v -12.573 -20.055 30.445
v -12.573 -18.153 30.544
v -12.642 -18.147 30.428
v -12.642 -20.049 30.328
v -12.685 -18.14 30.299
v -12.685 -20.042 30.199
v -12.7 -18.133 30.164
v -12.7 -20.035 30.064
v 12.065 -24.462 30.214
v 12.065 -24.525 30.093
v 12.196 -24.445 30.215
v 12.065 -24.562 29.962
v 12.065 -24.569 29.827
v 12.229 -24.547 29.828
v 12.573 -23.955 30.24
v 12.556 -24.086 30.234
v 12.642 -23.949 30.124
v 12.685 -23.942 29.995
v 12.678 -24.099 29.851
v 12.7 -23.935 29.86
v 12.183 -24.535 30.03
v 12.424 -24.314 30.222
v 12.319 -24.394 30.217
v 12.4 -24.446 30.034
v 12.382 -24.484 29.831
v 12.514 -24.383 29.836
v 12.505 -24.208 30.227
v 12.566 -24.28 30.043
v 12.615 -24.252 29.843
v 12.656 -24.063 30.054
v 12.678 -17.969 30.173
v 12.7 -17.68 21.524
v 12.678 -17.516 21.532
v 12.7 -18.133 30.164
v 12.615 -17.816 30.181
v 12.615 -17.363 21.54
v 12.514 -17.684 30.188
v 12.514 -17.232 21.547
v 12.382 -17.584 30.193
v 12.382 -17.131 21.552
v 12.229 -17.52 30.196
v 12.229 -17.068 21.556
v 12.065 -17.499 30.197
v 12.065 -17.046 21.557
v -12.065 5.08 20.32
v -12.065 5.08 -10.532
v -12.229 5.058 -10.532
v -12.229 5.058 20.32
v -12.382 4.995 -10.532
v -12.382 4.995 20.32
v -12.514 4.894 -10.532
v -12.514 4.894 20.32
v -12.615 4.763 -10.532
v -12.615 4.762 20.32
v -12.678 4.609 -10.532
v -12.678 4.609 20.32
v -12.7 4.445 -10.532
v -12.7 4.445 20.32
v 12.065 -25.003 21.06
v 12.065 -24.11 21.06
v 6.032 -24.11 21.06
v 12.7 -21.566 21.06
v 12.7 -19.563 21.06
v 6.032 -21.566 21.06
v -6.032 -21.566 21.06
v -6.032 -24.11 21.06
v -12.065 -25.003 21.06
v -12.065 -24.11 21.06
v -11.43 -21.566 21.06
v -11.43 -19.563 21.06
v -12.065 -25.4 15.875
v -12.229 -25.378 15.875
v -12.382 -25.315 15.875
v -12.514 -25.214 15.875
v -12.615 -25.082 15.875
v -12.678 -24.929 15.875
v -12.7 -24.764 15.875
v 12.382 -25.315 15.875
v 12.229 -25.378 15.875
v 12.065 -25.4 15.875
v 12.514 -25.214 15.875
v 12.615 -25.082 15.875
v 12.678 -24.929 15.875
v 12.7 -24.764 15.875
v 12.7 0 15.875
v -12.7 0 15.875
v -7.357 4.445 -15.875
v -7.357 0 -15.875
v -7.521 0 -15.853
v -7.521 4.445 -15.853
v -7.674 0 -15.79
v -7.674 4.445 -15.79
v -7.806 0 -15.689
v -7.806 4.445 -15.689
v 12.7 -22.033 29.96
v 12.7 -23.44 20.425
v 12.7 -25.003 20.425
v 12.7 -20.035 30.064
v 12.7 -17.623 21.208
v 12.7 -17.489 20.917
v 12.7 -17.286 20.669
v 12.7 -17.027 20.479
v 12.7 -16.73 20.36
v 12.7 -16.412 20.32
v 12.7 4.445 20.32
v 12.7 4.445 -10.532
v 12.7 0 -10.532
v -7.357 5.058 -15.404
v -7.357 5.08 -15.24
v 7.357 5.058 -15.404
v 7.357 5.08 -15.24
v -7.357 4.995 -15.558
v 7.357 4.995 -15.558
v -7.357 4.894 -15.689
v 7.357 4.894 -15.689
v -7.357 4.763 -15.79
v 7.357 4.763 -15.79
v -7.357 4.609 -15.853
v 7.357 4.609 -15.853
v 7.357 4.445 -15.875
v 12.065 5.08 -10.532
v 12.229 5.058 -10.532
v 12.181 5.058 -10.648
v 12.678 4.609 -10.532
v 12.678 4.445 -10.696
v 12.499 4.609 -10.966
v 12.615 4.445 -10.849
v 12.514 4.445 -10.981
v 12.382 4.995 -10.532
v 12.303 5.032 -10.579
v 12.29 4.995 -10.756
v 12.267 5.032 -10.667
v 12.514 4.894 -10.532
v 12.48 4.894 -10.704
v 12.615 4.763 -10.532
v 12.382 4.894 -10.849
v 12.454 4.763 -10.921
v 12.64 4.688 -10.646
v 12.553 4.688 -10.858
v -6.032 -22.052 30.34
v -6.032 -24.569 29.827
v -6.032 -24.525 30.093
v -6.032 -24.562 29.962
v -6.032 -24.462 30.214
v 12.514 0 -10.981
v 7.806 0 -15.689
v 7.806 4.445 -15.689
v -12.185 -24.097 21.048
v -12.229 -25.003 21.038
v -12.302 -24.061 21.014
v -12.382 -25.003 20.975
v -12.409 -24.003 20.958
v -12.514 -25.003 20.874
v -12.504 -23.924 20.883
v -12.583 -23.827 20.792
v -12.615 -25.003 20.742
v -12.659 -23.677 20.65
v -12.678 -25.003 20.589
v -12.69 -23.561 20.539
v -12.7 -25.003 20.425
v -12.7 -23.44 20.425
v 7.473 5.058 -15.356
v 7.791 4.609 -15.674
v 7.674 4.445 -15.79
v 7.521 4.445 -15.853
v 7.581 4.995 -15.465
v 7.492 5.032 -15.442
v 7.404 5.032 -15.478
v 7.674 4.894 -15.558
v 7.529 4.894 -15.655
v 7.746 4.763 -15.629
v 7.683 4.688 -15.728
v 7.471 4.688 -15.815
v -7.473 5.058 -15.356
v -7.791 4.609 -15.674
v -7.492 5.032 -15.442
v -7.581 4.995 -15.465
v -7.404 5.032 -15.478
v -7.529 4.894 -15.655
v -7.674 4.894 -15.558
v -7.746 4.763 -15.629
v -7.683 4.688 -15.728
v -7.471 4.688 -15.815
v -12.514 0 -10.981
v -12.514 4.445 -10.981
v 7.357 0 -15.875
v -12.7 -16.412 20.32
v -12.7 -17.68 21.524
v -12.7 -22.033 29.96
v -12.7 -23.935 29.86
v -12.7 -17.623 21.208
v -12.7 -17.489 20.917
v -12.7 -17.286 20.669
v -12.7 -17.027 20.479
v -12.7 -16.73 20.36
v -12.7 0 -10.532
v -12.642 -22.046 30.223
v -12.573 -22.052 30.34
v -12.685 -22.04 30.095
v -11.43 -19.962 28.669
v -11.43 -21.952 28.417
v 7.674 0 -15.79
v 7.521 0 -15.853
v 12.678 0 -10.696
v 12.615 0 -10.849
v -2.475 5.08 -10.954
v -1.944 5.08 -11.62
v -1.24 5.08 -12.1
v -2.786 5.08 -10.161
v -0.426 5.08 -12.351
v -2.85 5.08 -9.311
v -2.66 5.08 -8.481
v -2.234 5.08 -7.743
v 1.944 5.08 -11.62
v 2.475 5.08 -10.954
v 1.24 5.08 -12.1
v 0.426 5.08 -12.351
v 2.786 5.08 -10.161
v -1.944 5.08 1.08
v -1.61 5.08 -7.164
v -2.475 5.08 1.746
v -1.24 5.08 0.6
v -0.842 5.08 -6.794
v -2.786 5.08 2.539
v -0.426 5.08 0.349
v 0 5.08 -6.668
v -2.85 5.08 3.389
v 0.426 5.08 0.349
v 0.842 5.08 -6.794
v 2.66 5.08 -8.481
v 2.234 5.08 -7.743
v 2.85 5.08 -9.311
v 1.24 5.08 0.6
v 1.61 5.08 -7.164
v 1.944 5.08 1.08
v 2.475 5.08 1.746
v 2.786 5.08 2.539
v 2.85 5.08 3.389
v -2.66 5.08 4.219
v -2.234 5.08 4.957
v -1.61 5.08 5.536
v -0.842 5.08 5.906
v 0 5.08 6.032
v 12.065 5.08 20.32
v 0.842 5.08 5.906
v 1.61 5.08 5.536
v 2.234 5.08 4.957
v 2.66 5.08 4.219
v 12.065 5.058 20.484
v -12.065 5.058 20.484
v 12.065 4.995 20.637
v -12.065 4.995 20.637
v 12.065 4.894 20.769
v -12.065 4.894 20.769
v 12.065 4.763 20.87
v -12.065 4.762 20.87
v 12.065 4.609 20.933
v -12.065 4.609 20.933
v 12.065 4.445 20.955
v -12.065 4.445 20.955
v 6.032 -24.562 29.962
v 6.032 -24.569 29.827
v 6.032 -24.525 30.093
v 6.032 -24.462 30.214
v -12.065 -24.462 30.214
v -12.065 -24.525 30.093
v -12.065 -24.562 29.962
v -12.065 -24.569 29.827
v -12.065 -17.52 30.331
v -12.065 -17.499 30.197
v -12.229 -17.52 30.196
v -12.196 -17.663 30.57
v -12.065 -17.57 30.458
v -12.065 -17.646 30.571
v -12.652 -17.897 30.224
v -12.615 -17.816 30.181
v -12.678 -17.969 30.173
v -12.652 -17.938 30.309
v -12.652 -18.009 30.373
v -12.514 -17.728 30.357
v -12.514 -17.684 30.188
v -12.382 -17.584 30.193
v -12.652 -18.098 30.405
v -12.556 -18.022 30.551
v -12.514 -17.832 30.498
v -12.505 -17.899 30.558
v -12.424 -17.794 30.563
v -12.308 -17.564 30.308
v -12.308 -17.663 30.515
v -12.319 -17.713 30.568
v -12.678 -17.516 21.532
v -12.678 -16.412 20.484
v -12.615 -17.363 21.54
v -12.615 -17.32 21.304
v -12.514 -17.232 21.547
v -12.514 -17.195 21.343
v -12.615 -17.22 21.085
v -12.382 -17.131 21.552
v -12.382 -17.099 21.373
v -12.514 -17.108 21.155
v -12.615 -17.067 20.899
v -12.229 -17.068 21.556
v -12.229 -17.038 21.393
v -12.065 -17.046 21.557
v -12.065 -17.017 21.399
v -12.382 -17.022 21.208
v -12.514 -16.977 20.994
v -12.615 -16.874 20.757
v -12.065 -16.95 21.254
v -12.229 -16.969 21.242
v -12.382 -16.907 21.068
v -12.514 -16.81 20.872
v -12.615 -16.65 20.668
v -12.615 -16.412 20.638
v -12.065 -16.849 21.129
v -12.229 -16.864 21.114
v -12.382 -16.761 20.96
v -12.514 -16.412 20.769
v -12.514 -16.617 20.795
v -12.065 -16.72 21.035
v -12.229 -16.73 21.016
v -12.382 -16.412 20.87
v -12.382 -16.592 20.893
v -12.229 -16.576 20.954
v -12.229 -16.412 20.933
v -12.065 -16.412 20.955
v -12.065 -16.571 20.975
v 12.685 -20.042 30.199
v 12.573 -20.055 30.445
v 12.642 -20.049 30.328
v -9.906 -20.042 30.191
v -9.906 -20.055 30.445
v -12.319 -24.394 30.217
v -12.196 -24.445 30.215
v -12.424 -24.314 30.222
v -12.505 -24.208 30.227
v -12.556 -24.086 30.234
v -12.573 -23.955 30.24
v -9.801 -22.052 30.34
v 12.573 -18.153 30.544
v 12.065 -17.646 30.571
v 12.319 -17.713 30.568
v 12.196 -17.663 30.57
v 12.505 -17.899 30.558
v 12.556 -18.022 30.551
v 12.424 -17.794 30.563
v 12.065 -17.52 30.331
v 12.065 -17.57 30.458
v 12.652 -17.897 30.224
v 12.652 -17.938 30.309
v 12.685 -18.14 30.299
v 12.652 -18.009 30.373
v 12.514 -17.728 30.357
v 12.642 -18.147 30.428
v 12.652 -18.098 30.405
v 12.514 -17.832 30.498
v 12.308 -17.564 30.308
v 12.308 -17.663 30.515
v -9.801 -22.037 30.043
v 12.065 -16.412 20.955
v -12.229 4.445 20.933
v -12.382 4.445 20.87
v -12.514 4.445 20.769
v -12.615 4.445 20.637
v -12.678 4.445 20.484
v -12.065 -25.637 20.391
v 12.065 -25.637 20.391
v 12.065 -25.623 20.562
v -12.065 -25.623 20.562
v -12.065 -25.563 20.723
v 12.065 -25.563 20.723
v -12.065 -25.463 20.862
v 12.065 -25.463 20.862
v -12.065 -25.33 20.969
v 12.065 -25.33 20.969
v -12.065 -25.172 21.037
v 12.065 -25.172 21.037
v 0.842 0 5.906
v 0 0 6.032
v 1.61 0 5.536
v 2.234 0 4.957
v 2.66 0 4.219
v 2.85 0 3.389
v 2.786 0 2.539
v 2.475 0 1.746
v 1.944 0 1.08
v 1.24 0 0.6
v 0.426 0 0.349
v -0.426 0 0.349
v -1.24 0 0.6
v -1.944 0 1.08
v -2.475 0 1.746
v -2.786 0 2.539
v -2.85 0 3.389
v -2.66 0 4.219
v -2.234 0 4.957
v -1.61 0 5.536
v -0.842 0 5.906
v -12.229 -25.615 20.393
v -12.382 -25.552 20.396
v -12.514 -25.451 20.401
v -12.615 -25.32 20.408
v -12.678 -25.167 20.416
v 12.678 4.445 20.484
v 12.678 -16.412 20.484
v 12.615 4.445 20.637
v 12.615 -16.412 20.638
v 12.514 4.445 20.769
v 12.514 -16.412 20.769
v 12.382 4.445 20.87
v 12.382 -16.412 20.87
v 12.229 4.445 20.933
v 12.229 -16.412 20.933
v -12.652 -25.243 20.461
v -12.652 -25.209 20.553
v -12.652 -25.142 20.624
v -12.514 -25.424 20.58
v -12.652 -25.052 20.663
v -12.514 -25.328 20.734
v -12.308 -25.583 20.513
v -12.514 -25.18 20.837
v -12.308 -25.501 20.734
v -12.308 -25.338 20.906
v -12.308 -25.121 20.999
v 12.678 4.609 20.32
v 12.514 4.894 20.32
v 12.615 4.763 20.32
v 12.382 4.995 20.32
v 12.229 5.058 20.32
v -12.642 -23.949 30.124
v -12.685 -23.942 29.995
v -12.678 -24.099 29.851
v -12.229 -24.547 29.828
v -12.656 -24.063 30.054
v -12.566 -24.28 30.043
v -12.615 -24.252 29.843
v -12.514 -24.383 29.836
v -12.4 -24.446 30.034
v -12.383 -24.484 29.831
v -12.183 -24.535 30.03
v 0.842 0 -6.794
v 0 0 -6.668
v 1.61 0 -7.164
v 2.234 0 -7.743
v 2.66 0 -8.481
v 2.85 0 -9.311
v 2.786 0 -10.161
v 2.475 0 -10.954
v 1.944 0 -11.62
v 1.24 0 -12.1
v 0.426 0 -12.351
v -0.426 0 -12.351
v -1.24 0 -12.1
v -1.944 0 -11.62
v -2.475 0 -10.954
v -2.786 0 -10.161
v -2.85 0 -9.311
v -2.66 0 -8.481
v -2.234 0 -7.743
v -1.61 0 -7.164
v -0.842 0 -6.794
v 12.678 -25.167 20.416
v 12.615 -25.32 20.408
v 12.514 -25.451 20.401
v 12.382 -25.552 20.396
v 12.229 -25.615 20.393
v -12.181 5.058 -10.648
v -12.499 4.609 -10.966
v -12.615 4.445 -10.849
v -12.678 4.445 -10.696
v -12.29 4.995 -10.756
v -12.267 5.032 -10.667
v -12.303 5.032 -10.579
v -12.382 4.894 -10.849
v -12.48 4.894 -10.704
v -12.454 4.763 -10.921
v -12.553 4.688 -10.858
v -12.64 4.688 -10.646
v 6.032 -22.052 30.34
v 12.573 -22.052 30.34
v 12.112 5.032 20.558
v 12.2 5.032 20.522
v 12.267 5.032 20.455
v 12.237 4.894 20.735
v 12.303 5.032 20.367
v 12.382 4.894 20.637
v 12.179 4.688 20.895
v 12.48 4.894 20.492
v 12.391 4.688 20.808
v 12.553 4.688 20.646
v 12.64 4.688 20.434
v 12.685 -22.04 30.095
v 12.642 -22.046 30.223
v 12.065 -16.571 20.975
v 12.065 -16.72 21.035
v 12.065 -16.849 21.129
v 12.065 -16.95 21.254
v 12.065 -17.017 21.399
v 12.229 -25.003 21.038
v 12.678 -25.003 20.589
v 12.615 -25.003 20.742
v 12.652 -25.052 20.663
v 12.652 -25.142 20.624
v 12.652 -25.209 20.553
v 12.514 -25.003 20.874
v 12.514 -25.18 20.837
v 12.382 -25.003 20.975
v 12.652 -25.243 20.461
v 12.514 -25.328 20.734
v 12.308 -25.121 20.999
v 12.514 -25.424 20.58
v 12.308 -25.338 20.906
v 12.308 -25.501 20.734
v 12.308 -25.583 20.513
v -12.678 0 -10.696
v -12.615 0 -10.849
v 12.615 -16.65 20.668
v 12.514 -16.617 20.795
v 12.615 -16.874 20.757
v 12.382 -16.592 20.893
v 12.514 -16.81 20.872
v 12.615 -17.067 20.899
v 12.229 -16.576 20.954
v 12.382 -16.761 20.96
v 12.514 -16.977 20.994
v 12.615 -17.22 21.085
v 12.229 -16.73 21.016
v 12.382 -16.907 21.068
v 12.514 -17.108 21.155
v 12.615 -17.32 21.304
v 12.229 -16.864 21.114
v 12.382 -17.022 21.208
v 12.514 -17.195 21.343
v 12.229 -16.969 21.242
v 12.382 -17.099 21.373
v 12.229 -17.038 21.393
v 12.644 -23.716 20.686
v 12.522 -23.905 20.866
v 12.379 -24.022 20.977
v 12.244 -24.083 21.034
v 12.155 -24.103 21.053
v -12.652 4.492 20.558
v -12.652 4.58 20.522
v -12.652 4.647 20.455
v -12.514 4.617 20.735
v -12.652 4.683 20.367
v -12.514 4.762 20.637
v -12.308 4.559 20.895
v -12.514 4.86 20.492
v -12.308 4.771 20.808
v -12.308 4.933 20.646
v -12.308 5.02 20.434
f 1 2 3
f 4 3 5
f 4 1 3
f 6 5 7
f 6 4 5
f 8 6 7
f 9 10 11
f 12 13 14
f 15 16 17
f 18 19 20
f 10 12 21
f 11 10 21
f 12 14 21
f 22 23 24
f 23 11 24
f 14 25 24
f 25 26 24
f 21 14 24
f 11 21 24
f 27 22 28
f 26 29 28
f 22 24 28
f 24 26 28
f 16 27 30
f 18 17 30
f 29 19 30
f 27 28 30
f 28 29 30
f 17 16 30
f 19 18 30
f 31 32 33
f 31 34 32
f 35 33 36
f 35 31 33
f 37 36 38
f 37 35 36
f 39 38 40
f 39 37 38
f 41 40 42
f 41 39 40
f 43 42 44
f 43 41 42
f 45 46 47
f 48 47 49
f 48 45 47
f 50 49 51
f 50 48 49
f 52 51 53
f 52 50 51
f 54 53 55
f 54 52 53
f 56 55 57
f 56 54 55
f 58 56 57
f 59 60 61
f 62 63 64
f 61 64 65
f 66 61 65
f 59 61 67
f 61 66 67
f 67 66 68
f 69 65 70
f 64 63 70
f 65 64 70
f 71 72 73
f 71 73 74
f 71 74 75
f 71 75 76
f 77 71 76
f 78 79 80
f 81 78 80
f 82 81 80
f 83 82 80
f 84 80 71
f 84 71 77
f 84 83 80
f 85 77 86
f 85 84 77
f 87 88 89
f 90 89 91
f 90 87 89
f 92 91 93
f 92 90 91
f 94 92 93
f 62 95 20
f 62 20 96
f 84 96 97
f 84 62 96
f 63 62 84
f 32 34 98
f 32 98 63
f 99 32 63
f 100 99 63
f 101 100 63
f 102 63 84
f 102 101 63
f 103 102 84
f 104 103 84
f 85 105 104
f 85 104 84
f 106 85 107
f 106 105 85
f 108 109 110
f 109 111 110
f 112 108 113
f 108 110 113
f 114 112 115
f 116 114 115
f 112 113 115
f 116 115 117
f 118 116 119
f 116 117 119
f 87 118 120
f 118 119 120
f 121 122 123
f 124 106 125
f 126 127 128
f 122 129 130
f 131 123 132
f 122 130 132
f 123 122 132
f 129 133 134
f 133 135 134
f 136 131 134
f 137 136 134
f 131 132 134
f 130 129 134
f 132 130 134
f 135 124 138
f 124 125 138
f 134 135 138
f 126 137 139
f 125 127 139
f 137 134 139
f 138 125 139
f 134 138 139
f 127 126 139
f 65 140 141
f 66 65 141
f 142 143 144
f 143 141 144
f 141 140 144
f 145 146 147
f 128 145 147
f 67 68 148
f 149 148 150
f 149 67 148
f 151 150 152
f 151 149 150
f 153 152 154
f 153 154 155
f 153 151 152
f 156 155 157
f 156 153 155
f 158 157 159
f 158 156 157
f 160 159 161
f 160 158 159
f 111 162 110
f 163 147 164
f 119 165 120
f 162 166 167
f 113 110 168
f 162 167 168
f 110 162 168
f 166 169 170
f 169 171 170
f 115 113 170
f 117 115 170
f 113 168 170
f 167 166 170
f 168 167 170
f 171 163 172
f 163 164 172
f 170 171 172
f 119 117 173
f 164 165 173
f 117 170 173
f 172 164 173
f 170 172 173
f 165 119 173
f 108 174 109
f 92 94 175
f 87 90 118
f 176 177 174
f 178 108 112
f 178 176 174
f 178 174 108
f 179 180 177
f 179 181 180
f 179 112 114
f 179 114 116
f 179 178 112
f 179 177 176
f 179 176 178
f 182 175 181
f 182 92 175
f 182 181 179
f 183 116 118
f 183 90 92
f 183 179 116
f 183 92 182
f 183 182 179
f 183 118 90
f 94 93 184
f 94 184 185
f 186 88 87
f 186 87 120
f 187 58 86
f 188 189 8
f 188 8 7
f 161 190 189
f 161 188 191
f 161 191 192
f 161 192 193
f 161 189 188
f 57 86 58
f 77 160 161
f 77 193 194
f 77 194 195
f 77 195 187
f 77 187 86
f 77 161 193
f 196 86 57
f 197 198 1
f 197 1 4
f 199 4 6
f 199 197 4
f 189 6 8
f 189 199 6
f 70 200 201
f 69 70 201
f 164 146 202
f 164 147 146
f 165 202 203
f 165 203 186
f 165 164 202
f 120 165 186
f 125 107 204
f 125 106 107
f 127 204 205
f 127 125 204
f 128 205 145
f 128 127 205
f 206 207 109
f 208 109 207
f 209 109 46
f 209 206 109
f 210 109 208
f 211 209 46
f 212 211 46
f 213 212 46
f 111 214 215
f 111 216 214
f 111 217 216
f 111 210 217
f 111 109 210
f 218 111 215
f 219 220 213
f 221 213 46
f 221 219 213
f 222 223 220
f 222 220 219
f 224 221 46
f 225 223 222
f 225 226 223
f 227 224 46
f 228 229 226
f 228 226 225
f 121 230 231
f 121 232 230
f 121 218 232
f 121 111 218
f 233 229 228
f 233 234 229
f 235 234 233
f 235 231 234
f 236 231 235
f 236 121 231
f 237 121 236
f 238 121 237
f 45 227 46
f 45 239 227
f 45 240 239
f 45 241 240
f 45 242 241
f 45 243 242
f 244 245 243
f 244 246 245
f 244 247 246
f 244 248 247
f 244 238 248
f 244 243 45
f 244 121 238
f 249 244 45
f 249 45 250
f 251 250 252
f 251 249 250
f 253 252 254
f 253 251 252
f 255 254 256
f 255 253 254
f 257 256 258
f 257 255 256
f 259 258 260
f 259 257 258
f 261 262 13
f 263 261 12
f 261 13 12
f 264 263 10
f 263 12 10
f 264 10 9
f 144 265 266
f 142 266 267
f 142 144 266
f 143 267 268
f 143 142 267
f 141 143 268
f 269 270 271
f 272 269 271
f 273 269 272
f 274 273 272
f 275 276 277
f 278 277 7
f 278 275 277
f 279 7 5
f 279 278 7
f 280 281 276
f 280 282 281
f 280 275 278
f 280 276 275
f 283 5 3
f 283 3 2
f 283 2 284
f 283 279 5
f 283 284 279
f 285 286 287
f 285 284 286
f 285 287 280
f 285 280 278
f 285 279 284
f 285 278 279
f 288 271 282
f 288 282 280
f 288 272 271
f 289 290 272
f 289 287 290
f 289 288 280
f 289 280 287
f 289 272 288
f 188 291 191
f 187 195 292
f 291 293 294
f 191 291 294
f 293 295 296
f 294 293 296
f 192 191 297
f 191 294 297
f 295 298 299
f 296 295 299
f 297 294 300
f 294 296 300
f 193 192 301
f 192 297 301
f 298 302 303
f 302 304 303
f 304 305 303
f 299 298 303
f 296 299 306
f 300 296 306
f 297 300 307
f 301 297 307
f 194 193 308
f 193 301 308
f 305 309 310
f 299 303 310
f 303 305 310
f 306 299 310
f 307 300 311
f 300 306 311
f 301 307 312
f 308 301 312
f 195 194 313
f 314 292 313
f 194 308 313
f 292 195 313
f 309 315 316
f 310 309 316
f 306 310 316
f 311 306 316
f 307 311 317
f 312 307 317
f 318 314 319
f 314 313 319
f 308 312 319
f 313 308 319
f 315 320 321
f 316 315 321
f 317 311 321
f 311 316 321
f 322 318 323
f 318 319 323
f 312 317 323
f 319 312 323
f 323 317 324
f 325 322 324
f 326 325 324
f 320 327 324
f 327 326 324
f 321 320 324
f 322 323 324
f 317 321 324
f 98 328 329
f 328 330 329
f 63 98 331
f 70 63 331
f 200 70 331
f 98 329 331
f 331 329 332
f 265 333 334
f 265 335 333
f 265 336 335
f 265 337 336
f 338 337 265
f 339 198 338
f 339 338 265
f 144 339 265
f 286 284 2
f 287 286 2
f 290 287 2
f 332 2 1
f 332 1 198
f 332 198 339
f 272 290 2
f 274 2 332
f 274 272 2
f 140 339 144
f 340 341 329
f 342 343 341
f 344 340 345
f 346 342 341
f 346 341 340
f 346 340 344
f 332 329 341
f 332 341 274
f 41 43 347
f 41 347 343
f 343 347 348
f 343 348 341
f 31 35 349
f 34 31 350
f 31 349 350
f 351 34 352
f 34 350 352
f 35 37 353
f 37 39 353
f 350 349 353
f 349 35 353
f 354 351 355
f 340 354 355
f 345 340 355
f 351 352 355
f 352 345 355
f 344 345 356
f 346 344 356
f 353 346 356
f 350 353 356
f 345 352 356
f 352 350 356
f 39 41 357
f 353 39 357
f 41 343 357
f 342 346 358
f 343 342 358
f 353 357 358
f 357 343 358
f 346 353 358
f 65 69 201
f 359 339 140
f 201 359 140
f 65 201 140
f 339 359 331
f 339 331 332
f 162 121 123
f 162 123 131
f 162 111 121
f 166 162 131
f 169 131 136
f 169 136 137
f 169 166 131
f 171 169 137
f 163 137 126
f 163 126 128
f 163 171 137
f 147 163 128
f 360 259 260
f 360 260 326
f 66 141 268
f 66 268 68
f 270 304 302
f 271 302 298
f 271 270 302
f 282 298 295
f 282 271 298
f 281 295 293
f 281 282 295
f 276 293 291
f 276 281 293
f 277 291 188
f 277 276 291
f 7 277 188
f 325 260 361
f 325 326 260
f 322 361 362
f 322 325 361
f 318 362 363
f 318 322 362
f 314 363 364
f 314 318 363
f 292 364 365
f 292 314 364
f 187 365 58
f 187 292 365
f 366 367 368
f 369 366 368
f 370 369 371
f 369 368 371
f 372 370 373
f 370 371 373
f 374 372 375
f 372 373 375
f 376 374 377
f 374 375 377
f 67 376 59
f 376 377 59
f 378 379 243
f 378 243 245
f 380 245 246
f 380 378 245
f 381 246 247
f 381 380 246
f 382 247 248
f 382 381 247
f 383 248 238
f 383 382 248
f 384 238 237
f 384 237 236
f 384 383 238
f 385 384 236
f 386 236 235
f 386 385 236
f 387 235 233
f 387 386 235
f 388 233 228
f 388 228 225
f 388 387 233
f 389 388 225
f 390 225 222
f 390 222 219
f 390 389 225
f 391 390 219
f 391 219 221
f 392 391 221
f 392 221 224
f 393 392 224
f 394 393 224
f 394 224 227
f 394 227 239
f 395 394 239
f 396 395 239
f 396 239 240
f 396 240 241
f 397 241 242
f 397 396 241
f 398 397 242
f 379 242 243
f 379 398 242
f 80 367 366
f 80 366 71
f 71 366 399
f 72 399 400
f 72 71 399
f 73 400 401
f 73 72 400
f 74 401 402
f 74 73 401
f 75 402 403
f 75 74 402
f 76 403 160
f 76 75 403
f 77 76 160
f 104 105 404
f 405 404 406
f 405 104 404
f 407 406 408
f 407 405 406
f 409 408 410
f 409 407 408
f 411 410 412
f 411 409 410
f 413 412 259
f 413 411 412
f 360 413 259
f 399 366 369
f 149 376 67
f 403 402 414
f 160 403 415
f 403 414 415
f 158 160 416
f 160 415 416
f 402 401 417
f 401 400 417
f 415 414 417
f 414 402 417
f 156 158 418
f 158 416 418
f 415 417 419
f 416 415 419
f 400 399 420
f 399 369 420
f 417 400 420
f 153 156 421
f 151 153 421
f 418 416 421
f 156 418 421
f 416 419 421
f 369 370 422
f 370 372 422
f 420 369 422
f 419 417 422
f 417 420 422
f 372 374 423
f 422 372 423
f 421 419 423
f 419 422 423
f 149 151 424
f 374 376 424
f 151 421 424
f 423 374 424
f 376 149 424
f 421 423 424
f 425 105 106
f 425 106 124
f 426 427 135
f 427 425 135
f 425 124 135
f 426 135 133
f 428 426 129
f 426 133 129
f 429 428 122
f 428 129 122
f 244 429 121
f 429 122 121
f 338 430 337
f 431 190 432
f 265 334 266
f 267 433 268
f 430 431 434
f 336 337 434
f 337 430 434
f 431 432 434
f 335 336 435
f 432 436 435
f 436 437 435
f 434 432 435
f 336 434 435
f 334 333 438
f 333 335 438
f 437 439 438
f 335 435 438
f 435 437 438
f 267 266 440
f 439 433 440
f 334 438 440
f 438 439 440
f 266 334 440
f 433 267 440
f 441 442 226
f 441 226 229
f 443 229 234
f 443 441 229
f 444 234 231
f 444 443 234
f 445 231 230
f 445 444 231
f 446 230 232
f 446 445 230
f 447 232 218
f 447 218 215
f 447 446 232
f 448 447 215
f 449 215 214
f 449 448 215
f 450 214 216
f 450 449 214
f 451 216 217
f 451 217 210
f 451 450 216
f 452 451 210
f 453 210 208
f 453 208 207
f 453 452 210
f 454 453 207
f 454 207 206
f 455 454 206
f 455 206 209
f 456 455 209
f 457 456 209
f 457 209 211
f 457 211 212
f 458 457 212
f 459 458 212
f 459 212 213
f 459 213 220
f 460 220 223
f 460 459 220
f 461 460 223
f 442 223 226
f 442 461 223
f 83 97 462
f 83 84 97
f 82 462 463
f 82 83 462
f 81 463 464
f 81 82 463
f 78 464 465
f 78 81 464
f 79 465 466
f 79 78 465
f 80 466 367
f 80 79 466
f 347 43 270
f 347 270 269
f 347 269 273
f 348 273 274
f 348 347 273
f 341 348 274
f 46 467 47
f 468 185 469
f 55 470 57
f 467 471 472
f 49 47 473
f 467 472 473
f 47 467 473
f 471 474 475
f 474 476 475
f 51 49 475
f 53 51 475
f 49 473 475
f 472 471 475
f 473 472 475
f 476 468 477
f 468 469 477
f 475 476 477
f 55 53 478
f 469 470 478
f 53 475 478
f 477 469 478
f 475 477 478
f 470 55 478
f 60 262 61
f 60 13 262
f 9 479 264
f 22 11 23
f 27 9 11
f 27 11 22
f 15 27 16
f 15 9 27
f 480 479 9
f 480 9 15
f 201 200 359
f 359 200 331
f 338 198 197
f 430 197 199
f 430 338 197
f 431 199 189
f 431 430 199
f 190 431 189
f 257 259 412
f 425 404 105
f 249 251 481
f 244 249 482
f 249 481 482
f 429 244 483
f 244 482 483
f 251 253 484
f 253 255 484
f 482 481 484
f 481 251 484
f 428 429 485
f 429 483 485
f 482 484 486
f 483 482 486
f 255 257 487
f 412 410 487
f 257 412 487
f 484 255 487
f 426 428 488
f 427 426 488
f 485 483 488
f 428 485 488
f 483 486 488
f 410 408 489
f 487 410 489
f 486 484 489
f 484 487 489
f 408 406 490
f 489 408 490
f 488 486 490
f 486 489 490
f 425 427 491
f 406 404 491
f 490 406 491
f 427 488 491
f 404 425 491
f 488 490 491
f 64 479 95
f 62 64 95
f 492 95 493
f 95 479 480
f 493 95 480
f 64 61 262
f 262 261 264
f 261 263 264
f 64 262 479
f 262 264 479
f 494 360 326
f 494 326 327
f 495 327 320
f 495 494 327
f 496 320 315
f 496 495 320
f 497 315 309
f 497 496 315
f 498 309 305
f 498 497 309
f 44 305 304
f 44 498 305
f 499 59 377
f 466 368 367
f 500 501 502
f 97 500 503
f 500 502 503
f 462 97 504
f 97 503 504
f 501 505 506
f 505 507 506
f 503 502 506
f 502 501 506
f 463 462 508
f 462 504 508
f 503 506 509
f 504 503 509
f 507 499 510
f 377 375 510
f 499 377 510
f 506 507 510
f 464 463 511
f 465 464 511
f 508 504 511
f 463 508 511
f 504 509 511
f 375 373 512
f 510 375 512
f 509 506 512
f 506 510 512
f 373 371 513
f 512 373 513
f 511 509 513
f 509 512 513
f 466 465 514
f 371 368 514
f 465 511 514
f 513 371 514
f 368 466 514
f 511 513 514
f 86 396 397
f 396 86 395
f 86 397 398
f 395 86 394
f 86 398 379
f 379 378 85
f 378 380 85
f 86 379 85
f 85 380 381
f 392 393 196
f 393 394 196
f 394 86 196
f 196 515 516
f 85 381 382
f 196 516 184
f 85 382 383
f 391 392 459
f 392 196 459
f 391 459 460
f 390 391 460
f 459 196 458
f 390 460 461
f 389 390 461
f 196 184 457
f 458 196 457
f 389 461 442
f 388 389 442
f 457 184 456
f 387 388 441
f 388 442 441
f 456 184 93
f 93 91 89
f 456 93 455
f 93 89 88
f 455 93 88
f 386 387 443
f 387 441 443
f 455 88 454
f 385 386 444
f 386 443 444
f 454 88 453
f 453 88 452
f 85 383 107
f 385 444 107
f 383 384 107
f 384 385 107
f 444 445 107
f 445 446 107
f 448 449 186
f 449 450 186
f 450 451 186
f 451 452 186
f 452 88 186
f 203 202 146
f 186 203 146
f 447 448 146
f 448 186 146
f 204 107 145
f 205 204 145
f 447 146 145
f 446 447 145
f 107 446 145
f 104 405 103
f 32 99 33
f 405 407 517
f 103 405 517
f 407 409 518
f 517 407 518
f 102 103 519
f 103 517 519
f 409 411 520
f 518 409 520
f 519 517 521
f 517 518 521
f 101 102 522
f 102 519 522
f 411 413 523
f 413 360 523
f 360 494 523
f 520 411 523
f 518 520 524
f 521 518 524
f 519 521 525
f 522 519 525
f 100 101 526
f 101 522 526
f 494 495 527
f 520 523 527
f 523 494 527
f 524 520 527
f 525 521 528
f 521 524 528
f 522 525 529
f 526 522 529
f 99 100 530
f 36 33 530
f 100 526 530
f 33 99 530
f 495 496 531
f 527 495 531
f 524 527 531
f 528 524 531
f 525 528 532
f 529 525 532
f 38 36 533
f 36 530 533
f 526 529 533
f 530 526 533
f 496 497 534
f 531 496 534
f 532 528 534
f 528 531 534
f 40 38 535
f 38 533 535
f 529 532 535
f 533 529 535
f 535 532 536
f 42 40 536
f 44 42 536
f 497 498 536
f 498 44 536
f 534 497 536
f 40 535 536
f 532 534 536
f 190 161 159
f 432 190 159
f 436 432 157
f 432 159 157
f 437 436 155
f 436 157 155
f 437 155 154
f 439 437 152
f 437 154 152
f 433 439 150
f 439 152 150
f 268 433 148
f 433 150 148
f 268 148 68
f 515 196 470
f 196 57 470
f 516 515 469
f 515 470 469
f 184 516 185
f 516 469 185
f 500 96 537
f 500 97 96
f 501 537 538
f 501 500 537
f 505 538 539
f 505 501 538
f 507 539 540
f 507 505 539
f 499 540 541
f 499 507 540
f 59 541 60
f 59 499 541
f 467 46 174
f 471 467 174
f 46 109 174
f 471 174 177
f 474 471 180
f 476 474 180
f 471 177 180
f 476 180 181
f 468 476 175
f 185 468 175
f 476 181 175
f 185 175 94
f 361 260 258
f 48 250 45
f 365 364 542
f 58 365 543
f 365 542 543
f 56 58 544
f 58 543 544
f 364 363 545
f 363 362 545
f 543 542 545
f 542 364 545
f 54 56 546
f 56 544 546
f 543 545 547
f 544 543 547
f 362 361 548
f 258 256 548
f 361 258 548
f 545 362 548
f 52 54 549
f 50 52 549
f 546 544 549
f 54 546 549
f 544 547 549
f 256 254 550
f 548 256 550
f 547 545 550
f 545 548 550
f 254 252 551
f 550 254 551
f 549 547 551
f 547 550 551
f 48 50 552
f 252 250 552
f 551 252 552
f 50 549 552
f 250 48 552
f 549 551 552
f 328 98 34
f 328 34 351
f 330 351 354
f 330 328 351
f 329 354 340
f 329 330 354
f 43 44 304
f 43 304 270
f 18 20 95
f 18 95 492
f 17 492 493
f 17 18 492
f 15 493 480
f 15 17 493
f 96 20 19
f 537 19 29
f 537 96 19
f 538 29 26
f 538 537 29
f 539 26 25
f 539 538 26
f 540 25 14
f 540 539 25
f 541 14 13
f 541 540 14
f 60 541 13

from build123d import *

# Parameters (mm, degrees)
SKETCH1_W                       = 25.4
SKETCH1_H                       = 31.75
SKETCH1_R                       = 2.8575
BOSS_EXTRUDE1_DEPTH             = 5.08
BOSS_EXTRUDE2_REACH             = 22.955
BOSS_EXTRUDE2_DIRECTION_2_REACH = 22.955
CUT_EXTRUDE3_REACH              = 56.752
BOSS_EXTRUDE3_DEPTH             = 2
BOSS_EXTRUDE3_DRAFT             = -3
CHAMFER1_SIZE                   = 5.08
FILLET1_R                       = 0.635
SKETCH8_W                       = 25.4
SKETCH8_H                       = 6.35
CUT_EXTRUDE4_DEPTH              = 41.010145227


with BuildPart() as part:
    # Sketch1 → Boss-Extrude1 (new body)
    with BuildSketch(Plane(origin=(0, 0, 0), x_dir=(1, 0, 0), z_dir=(0, 1, 0))):
        Rectangle(SKETCH1_W, SKETCH1_H)
        with Locations(Location((0, 9.525, 0), (0, 0, 270))):
            Circle(SKETCH1_R, mode=Mode.SUBTRACT)
        with Locations(Location((0, -3.175, 0), (0, 0, 270))):
            Circle(SKETCH1_R, mode=Mode.SUBTRACT)
    extrude(amount=BOSS_EXTRUDE1_DEPTH)

    # Boss-Extrude2: up to this face of the body (flat: up to its plane)
    boss_extrude2_end = Plane(part.part.faces().sort_by_distance((12.7, 2.54, 0))[0])
    # Sketch2 → Boss-Extrude2 (add, up to the picked face)
    with BuildSketch(Plane(origin=(0, 0, 0), x_dir=(0, 0, -1), z_dir=(1, 0, 0)), mode=Mode.PRIVATE) as boss_extrude2_sk1:
        Polygon((-15.875, 5.08), (-20.955, 5.08), (-20.955, -17.014374457), (-30.831377514, -17.53197347), (-30.460838941, -24.60227064), (-21.059671916, -24.109576354), (-21.059671916, -25.671717141), (-15.875, -25.4), align=None)
    boss_extrude2_tool1 = split(extrude(boss_extrude2_sk1.sketch, amount=BOSS_EXTRUDE2_REACH, mode=Mode.PRIVATE), bisect_by=boss_extrude2_end, keep=Keep.BOTH, mode=Mode.PRIVATE)
    # Sketch2 → Boss-Extrude2 (add, up to the picked face)
    with BuildSketch(Plane(origin=(0, 0, 0), x_dir=(0, 0, -1), z_dir=(1, 0, 0)), mode=Mode.PRIVATE) as boss_extrude2_sk2:
        Polygon((-30.698444185, -20.068492489), (-30.593772269, -22.065751622), (-21.059671916, -21.566090595), (-21.059671916, -19.563345839), align=None)
    boss_extrude2_tool2 = split(extrude(boss_extrude2_sk2.sketch, amount=BOSS_EXTRUDE2_REACH, mode=Mode.PRIVATE), bisect_by=boss_extrude2_end, keep=Keep.BOTH, mode=Mode.PRIVATE)
    add(boss_extrude2_tool1.solids().sort_by(Axis((0, -13.472044, 20.681092), (1, 0, 0)))[0])
    add(boss_extrude2_tool2.solids().sort_by(Axis((0, -20.8141, 25.852938), (1, 0, 0)))[0])

    # Boss-Extrude2 direction 2: up to this face of the body (flat: up to its plane)
    boss_extrude2_direction_2_end = Plane(part.part.faces().sort_by_distance((-12.7, 2.54, 0))[0])
    # Sketch2 → Boss-Extrude2 direction 2 (add, up to the picked face)
    with BuildSketch(Plane(origin=(0, 0, 0), x_dir=(0, 0, -1), z_dir=(1, 0, 0)), mode=Mode.PRIVATE) as boss_extrude2_direction_2_sk1:
        Polygon((-15.875, 5.08), (-20.955, 5.08), (-20.955, -17.014374457), (-30.831377514, -17.53197347), (-30.460838941, -24.60227064), (-21.059671916, -24.109576354), (-21.059671916, -25.671717141), (-15.875, -25.4), align=None)
    boss_extrude2_direction_2_tool1 = split(extrude(boss_extrude2_direction_2_sk1.sketch, amount=-BOSS_EXTRUDE2_DIRECTION_2_REACH, mode=Mode.PRIVATE), bisect_by=boss_extrude2_direction_2_end, keep=Keep.BOTH, mode=Mode.PRIVATE)
    # Sketch2 → Boss-Extrude2 direction 2 (add, up to the picked face)
    with BuildSketch(Plane(origin=(0, 0, 0), x_dir=(0, 0, -1), z_dir=(1, 0, 0)), mode=Mode.PRIVATE) as boss_extrude2_direction_2_sk2:
        Polygon((-30.698444185, -20.068492489), (-30.593772269, -22.065751622), (-21.059671916, -21.566090595), (-21.059671916, -19.563345839), align=None)
    boss_extrude2_direction_2_tool2 = split(extrude(boss_extrude2_direction_2_sk2.sketch, amount=-BOSS_EXTRUDE2_DIRECTION_2_REACH, mode=Mode.PRIVATE), bisect_by=boss_extrude2_direction_2_end, keep=Keep.BOTH, mode=Mode.PRIVATE)
    add(boss_extrude2_direction_2_tool1.solids().sort_by(Axis((0, -13.472044, 20.681092), (-1, 0, 0)))[0])
    add(boss_extrude2_direction_2_tool2.solids().sort_by(Axis((0, -20.8141, 25.852938), (-1, 0, 0)))[0])

    # Cut-Extrude3: up to this plane
    cut_extrude3_end = Plane(origin=(46.895925715, 0, 21.059671916), z_dir=(0, 0, -1))
    # Sketch4 → Cut-Extrude3 (cut, up to the surface)
    with BuildSketch(Plane(origin=(0, -1.659399249, 31.663223881), x_dir=(1, 0, 0), z_dir=(0, -0.052335956242941094, 0.9986295347545742)), mode=Mode.PRIVATE) as cut_extrude3_sk1:
        Polygon((-11.43, -20.434356949), (-6.0325, -20.434356949), (-6.0325, -22.974356949), (6.0325, -22.974356949), (6.0325, -20.434356949), (12.7, -20.434356949), (12.7, -18.434356885), (-11.43, -18.434356885), align=None)
    cut_extrude3_tool1 = split(extrude(cut_extrude3_sk1.sketch, amount=-CUT_EXTRUDE3_REACH, mode=Mode.PRIVATE), bisect_by=cut_extrude3_end, keep=Keep.BOTH, mode=Mode.PRIVATE)
    add(cut_extrude3_tool1.solids().sort_by_distance((0.388379, -21.947535, 30.599968))[0], mode=Mode.SUBTRACT)


with BuildPart() as boss_extrude3_tool:
    # Sketch5 → Boss-Extrude3 (with draft: the straight prism first)
    with BuildSketch(Plane(origin=(0, -18.40909324, -0.964779695), x_dir=(1, 0, 0), z_dir=(0, -0.9986295347545742, -0.052335956242941115))):
        Polygon((-11.43, 29.674676779), (-9.906, 31.198676779), (-9.906, 31.706676779), (-11.43, 31.706676779), align=None)
    extrude(amount=BOSS_EXTRUDE3_DEPTH)
    # Boss-Extrude3: the draft: its side faces are tilted about the plane it starts from
    boss_extrude3_sides = [boss_extrude3_tool.faces().sort_by_distance(p)[0] for p in [
        (-10.668, -21.000655359, 29.37784872),
        (-9.906, -21.05382869, 30.392456327),
        (-10.668, -21.067122023, 30.646108229),
        (-11.43, -21.013948692, 29.631500622),
    ]]
    draft(boss_extrude3_sides, Plane(origin=(0, -18.40909324, -0.964779695), x_dir=(1, 0, 0), z_dir=(0, -0.9986295347545742, -0.052335956242941115)), BOSS_EXTRUDE3_DRAFT)


with BuildPart() as part_1:
    add(part.part)

    # Boss-Extrude3: add boss_extrude3_tool
    add(boss_extrude3_tool.part)

    # Chamfer1
    chamfer1_edges = [part_1.edges().sort_by_distance(p)[0] for p in [
        (-12.7, 2.54, -15.875),
        (12.7, 2.54, -15.875),
    ]]
    chamfer(chamfer1_edges, length=CHAMFER1_SIZE)

    # Fillet1
    fillet1_edges = [part_1.edges().sort_by_distance(p)[0] for p in [
        (12.7, -5.967187229, 20.955),
        (0, 5.08, 20.955),
        (12.7, -25.535858571, 18.467335958),
        (0, -25.671717141, 21.059671916),
        (12.7, -24.890646748, 21.059671916),
        (12.7, -24.355923497, 25.760255428),
        (9.36625, -24.60227064, 30.460838941),
        (12.7, -23.334011131, 30.527305605),
        (0, -17.53197347, 30.831377514),
        (12.7, -17.273173964, 25.893188757),
        (0, -17.014374457, 20.955),
        (-12.7, -17.273173964, 25.893188757),
        (-12.7, -5.967187229, 20.955),
        (-12.7, -25.535858571, 18.467335958),
        (-12.7, -24.890646748, 21.059671916),
        (-12.7, -24.355923497, 25.760255428),
        (-12.7, -21.067122055, 30.646108227),
        (-9.36625, -24.60227064, 30.460838941),
        (12.7, -18.800232979, 30.76491085),
        (12.7, 5.08, 5.08),
        (-12.7, 5.08, 5.08),
        (-12.7, 2.54, -10.795),
        (0, 5.08, -15.875),
        (7.62, 2.54, -15.875),
        (-7.62, 2.54, -15.875),
        (10.16, 5.08, -13.335),
        (-10.16, 5.08, -13.335),
        (12.7, 2.54, -10.795),
    ]]
    fillet(fillet1_edges, radius=FILLET1_R)

    # Sketch8 → Cut-Extrude4 (cut, through all)
    with BuildSketch(Plane(origin=(0, -15.872574222, -0.831846366), x_dir=(1, 0, 0), z_dir=(0, 0.9986295347545742, 0.05233595624294136))):
        with Locations((0, -34.627676779)):
            Rectangle(SKETCH8_W, SKETCH8_H)
    extrude(amount=-CUT_EXTRUDE4_DEPTH, mode=Mode.SUBTRACT)


solid = part_1.part
